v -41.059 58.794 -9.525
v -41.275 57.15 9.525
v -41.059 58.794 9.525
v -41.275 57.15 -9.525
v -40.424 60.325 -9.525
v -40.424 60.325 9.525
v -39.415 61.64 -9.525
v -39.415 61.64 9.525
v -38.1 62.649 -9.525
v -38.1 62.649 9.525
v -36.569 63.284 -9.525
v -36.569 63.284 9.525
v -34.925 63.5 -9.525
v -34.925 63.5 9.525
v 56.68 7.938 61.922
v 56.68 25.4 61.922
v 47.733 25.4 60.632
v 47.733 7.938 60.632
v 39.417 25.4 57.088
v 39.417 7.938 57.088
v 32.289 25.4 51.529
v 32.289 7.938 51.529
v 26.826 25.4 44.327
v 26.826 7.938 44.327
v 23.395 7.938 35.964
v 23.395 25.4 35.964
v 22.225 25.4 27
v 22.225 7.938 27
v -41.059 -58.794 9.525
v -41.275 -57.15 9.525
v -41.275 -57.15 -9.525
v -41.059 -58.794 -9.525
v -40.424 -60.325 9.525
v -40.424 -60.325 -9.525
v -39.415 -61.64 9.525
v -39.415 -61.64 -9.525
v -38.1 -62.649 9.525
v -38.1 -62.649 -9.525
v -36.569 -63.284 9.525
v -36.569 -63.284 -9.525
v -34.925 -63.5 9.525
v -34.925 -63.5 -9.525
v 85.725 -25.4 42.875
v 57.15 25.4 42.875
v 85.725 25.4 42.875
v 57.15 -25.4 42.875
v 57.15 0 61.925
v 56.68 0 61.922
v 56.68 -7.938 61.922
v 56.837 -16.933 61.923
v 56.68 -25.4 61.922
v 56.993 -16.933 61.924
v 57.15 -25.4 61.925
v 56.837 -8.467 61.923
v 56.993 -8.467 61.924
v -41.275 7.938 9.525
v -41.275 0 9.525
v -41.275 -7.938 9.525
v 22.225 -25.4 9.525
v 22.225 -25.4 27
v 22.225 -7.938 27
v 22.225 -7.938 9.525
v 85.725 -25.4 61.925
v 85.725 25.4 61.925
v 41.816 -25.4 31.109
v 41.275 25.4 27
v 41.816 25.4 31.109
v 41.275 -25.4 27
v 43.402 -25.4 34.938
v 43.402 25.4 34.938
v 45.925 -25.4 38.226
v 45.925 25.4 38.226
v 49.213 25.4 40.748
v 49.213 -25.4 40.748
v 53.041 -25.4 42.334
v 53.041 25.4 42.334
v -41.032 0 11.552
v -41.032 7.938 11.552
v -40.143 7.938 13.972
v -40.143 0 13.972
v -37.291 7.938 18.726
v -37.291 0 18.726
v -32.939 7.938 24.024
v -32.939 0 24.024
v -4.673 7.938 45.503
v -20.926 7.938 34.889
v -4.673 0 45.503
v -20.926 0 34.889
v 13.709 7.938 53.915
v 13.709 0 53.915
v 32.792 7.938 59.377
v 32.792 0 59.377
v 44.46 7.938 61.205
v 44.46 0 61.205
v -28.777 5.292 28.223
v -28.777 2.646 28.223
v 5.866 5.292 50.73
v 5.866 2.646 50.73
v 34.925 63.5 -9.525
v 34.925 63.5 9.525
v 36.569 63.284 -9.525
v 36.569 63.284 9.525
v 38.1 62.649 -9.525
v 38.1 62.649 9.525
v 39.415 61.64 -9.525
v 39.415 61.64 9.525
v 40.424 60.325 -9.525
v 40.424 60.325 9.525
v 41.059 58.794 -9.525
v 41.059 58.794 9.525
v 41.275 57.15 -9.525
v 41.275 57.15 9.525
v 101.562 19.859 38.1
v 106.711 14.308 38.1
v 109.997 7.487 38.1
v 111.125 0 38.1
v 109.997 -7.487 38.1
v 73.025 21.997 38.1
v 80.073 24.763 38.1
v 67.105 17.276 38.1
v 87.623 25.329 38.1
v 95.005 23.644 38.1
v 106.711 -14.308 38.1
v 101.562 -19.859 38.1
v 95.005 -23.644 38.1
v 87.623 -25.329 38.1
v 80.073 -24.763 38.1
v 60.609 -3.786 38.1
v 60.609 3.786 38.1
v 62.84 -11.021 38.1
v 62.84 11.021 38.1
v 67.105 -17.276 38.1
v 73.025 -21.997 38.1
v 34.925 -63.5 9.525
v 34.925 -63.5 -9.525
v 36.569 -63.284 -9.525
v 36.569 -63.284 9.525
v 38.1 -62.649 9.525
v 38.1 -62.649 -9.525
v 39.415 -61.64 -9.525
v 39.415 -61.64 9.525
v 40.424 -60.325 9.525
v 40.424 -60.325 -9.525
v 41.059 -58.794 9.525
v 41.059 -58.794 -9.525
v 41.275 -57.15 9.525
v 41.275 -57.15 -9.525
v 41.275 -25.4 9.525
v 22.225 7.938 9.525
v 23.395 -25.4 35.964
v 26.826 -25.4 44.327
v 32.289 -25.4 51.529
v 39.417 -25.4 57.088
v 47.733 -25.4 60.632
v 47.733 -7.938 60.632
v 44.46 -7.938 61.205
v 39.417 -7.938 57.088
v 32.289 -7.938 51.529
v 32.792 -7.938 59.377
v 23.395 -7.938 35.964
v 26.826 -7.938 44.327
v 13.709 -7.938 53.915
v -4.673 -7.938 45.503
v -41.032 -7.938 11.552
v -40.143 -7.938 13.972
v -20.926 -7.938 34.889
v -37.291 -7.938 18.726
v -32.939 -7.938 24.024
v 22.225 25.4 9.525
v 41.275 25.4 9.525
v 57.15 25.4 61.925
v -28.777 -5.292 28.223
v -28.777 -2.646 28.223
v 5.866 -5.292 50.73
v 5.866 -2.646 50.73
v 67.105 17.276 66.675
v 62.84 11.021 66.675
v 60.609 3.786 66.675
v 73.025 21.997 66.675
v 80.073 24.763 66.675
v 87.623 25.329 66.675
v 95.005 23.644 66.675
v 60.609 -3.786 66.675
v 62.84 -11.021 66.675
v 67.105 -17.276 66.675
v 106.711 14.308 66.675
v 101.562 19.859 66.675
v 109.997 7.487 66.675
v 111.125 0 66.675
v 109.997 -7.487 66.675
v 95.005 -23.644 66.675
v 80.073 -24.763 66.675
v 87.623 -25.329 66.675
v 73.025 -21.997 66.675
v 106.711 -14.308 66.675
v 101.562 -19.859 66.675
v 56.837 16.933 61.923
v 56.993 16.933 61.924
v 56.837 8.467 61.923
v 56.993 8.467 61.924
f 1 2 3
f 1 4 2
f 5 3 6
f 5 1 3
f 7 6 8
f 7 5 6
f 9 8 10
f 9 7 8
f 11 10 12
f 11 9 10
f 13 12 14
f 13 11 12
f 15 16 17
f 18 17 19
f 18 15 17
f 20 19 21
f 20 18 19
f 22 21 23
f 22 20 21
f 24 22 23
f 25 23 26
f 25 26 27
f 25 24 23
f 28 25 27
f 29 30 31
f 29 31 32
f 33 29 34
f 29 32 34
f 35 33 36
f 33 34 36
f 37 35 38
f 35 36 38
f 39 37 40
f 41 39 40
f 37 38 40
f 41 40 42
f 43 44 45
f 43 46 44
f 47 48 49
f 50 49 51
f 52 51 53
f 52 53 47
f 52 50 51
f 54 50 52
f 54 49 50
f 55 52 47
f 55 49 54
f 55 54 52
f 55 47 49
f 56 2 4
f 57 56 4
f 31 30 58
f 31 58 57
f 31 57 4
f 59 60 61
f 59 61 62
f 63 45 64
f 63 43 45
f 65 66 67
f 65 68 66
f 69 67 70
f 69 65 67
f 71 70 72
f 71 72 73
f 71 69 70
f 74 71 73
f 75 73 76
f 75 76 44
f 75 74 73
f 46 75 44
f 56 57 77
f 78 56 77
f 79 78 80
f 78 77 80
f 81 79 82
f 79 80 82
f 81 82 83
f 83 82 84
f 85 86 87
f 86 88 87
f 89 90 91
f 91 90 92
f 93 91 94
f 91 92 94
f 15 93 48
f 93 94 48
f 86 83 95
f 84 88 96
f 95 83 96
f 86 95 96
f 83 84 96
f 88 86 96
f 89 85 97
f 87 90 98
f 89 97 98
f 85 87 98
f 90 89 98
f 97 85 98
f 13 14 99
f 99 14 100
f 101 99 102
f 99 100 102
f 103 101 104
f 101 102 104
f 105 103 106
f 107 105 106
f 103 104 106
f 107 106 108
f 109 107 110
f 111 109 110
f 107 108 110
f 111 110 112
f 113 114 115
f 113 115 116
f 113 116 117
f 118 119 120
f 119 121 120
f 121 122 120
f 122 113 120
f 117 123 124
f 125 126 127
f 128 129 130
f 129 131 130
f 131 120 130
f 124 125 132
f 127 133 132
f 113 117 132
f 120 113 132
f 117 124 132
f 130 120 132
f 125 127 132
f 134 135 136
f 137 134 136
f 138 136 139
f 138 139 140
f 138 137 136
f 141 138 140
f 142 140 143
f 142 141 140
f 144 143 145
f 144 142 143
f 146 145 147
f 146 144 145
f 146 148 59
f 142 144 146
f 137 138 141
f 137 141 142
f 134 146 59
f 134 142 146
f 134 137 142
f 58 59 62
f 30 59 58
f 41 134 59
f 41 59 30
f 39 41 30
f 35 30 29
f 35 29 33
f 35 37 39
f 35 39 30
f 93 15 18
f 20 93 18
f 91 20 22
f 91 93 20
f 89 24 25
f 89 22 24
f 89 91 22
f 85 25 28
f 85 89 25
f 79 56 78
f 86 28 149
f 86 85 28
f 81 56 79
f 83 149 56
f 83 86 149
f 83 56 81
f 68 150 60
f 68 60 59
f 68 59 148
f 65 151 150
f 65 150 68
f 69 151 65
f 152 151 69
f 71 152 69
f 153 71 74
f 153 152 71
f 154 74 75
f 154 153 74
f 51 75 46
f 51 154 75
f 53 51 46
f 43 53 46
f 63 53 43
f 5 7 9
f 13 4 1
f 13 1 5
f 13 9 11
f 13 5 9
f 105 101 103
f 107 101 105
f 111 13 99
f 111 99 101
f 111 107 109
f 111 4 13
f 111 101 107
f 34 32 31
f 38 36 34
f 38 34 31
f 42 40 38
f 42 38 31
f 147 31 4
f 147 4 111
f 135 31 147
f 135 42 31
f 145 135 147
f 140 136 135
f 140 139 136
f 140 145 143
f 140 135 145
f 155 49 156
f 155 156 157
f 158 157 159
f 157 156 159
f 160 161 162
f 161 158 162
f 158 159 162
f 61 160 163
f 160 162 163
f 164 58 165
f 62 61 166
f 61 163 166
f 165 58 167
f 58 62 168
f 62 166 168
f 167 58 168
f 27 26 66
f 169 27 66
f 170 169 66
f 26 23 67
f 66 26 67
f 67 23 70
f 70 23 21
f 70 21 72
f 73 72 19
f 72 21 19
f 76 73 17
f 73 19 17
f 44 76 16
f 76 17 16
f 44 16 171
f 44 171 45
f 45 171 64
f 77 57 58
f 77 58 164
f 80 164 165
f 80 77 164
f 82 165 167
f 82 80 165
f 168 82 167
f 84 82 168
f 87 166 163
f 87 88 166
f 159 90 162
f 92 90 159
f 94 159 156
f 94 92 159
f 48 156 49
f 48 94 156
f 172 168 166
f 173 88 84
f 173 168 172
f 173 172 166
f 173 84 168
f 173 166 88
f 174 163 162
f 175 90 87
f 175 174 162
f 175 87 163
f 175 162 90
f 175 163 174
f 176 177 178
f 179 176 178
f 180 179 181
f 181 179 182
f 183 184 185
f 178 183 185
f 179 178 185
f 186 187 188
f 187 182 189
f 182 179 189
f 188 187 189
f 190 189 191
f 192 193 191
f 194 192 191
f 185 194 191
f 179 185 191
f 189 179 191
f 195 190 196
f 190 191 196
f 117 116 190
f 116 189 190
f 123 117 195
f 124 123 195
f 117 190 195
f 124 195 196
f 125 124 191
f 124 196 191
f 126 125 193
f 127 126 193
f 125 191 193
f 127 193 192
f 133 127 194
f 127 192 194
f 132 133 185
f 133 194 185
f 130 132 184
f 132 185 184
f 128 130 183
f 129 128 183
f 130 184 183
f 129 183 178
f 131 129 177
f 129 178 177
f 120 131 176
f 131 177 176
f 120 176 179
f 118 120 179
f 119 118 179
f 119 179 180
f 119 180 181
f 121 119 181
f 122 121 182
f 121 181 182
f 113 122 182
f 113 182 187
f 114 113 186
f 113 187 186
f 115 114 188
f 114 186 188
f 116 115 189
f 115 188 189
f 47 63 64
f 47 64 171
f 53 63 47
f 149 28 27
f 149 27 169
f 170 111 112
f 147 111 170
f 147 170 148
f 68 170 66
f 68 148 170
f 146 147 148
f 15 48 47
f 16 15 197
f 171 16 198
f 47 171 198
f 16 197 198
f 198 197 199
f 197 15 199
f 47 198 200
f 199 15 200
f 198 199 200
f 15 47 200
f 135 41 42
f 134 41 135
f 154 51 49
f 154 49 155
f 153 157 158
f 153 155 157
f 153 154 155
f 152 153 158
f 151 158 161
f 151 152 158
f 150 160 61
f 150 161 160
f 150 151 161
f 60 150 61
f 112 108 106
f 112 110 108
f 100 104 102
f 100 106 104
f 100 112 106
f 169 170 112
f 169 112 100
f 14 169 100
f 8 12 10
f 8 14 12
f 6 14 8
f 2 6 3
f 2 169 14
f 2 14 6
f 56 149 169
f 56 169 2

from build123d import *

# Parameters (mm, degrees)
F1_DEPTH = 63.5
F0_W     = 25.4
F0_H     = 19.05
F2_DEPTH = 25.4
F3_DEPTH = 7.9375
F5_R     = 6.35


with BuildPart() as f1:
    # F0 (on Front) → F1 (new body, symmetric)
    with BuildSketch(Plane.XZ):
        Polygon((-41.275, 9.525), (-41.275, -9.525), (41.275, -9.525), (41.275, 9.525), (22.225, 9.525), align=None)
    extrude(amount=F1_DEPTH, both=True)

    # F0 (on Front) → F2 (join, symmetric)
    with BuildSketch(Plane.XZ):
        with Locations((73.025, 52.4002)):
            Rectangle(F0_W, F0_H)
        with BuildLine():
            Line((22.225, 9.525), (41.275, 9.525))
            Line((41.275, 9.525), (41.275, 27.0002))
            ThreePointArc((41.275, 27.0002), (45.9246798487, 38.2255201513), (57.15, 42.8752))
            Line((57.15, 42.8752), (60.325, 42.8752))
            Line((60.325, 42.8752), (60.325, 61.9252))
            Line((60.325, 61.9252), (57.15, 61.9252))
            add(Edge.make_bspline(
                [(56.6801270961, 61.9220390761), (56.8366358852, 61.9233931475), (56.9932603728, 61.9244472607), (57.15, 61.9252)],
                knots=[111.1987237501, 111.1987237501, 111.1987237501, 111.1987237501, 111.5045361635, 111.5045361635, 111.5045361635, 111.5045361635], degree=3))
            ThreePointArc((56.6801270961, 61.9220390761), (32.2887255338, 51.5292166317), (22.225, 27.0002))
            Line((22.225, 27.0002), (22.225, 9.525))
        make_face()
    extrude(amount=F2_DEPTH, both=True)

    # F0 (on Front) → F3 (join, symmetric)
    with BuildSketch(Plane.XZ):
        with BuildLine():
            add(Edge.make_bspline(
                [(-41.275, 9.525), (-41.8411235038, 21.2775444585), (-0.2291965204, 61.4296751081), (56.6801270961, 61.9220390761)],
                knots=[0, 0, 0, 0, 111.1987237501, 111.1987237501, 111.1987237501, 111.1987237501], degree=3))
            Line((-41.275, 9.525), (22.225, 9.525))
            Line((22.225, 9.525), (22.225, 27.0002))
            ThreePointArc((22.225, 27.0002), (32.2887255338, 51.5292166317), (56.6801270961, 61.9220390761))
        make_face()
    extrude(amount=F3_DEPTH, both=True)

    # F5
    f5_edges = [f1.edges().sort_by_distance(p)[0] for p in [
        (-41.275, -63.5, 0),
        (41.275, -63.5, 0),
        (41.275, 63.5, 0),
        (-41.275, 63.5, 0),
    ]]
    fillet(f5_edges, radius=F5_R)


with BuildPart() as f4:
    # F0 (on Front) → F4 (revolve)
    with BuildSketch(Plane.XZ):
        Polygon((85.725, 66.675), (85.725, 61.9252), (85.725, 42.8752), (85.725, 38.1), (111.125, 38.1), (111.125, 66.675), align=None)
    revolve(axis=Axis((85.725, 0, 52.3875), (0, 0, -1)))


solid = Compound([f1.part, f4.part])
